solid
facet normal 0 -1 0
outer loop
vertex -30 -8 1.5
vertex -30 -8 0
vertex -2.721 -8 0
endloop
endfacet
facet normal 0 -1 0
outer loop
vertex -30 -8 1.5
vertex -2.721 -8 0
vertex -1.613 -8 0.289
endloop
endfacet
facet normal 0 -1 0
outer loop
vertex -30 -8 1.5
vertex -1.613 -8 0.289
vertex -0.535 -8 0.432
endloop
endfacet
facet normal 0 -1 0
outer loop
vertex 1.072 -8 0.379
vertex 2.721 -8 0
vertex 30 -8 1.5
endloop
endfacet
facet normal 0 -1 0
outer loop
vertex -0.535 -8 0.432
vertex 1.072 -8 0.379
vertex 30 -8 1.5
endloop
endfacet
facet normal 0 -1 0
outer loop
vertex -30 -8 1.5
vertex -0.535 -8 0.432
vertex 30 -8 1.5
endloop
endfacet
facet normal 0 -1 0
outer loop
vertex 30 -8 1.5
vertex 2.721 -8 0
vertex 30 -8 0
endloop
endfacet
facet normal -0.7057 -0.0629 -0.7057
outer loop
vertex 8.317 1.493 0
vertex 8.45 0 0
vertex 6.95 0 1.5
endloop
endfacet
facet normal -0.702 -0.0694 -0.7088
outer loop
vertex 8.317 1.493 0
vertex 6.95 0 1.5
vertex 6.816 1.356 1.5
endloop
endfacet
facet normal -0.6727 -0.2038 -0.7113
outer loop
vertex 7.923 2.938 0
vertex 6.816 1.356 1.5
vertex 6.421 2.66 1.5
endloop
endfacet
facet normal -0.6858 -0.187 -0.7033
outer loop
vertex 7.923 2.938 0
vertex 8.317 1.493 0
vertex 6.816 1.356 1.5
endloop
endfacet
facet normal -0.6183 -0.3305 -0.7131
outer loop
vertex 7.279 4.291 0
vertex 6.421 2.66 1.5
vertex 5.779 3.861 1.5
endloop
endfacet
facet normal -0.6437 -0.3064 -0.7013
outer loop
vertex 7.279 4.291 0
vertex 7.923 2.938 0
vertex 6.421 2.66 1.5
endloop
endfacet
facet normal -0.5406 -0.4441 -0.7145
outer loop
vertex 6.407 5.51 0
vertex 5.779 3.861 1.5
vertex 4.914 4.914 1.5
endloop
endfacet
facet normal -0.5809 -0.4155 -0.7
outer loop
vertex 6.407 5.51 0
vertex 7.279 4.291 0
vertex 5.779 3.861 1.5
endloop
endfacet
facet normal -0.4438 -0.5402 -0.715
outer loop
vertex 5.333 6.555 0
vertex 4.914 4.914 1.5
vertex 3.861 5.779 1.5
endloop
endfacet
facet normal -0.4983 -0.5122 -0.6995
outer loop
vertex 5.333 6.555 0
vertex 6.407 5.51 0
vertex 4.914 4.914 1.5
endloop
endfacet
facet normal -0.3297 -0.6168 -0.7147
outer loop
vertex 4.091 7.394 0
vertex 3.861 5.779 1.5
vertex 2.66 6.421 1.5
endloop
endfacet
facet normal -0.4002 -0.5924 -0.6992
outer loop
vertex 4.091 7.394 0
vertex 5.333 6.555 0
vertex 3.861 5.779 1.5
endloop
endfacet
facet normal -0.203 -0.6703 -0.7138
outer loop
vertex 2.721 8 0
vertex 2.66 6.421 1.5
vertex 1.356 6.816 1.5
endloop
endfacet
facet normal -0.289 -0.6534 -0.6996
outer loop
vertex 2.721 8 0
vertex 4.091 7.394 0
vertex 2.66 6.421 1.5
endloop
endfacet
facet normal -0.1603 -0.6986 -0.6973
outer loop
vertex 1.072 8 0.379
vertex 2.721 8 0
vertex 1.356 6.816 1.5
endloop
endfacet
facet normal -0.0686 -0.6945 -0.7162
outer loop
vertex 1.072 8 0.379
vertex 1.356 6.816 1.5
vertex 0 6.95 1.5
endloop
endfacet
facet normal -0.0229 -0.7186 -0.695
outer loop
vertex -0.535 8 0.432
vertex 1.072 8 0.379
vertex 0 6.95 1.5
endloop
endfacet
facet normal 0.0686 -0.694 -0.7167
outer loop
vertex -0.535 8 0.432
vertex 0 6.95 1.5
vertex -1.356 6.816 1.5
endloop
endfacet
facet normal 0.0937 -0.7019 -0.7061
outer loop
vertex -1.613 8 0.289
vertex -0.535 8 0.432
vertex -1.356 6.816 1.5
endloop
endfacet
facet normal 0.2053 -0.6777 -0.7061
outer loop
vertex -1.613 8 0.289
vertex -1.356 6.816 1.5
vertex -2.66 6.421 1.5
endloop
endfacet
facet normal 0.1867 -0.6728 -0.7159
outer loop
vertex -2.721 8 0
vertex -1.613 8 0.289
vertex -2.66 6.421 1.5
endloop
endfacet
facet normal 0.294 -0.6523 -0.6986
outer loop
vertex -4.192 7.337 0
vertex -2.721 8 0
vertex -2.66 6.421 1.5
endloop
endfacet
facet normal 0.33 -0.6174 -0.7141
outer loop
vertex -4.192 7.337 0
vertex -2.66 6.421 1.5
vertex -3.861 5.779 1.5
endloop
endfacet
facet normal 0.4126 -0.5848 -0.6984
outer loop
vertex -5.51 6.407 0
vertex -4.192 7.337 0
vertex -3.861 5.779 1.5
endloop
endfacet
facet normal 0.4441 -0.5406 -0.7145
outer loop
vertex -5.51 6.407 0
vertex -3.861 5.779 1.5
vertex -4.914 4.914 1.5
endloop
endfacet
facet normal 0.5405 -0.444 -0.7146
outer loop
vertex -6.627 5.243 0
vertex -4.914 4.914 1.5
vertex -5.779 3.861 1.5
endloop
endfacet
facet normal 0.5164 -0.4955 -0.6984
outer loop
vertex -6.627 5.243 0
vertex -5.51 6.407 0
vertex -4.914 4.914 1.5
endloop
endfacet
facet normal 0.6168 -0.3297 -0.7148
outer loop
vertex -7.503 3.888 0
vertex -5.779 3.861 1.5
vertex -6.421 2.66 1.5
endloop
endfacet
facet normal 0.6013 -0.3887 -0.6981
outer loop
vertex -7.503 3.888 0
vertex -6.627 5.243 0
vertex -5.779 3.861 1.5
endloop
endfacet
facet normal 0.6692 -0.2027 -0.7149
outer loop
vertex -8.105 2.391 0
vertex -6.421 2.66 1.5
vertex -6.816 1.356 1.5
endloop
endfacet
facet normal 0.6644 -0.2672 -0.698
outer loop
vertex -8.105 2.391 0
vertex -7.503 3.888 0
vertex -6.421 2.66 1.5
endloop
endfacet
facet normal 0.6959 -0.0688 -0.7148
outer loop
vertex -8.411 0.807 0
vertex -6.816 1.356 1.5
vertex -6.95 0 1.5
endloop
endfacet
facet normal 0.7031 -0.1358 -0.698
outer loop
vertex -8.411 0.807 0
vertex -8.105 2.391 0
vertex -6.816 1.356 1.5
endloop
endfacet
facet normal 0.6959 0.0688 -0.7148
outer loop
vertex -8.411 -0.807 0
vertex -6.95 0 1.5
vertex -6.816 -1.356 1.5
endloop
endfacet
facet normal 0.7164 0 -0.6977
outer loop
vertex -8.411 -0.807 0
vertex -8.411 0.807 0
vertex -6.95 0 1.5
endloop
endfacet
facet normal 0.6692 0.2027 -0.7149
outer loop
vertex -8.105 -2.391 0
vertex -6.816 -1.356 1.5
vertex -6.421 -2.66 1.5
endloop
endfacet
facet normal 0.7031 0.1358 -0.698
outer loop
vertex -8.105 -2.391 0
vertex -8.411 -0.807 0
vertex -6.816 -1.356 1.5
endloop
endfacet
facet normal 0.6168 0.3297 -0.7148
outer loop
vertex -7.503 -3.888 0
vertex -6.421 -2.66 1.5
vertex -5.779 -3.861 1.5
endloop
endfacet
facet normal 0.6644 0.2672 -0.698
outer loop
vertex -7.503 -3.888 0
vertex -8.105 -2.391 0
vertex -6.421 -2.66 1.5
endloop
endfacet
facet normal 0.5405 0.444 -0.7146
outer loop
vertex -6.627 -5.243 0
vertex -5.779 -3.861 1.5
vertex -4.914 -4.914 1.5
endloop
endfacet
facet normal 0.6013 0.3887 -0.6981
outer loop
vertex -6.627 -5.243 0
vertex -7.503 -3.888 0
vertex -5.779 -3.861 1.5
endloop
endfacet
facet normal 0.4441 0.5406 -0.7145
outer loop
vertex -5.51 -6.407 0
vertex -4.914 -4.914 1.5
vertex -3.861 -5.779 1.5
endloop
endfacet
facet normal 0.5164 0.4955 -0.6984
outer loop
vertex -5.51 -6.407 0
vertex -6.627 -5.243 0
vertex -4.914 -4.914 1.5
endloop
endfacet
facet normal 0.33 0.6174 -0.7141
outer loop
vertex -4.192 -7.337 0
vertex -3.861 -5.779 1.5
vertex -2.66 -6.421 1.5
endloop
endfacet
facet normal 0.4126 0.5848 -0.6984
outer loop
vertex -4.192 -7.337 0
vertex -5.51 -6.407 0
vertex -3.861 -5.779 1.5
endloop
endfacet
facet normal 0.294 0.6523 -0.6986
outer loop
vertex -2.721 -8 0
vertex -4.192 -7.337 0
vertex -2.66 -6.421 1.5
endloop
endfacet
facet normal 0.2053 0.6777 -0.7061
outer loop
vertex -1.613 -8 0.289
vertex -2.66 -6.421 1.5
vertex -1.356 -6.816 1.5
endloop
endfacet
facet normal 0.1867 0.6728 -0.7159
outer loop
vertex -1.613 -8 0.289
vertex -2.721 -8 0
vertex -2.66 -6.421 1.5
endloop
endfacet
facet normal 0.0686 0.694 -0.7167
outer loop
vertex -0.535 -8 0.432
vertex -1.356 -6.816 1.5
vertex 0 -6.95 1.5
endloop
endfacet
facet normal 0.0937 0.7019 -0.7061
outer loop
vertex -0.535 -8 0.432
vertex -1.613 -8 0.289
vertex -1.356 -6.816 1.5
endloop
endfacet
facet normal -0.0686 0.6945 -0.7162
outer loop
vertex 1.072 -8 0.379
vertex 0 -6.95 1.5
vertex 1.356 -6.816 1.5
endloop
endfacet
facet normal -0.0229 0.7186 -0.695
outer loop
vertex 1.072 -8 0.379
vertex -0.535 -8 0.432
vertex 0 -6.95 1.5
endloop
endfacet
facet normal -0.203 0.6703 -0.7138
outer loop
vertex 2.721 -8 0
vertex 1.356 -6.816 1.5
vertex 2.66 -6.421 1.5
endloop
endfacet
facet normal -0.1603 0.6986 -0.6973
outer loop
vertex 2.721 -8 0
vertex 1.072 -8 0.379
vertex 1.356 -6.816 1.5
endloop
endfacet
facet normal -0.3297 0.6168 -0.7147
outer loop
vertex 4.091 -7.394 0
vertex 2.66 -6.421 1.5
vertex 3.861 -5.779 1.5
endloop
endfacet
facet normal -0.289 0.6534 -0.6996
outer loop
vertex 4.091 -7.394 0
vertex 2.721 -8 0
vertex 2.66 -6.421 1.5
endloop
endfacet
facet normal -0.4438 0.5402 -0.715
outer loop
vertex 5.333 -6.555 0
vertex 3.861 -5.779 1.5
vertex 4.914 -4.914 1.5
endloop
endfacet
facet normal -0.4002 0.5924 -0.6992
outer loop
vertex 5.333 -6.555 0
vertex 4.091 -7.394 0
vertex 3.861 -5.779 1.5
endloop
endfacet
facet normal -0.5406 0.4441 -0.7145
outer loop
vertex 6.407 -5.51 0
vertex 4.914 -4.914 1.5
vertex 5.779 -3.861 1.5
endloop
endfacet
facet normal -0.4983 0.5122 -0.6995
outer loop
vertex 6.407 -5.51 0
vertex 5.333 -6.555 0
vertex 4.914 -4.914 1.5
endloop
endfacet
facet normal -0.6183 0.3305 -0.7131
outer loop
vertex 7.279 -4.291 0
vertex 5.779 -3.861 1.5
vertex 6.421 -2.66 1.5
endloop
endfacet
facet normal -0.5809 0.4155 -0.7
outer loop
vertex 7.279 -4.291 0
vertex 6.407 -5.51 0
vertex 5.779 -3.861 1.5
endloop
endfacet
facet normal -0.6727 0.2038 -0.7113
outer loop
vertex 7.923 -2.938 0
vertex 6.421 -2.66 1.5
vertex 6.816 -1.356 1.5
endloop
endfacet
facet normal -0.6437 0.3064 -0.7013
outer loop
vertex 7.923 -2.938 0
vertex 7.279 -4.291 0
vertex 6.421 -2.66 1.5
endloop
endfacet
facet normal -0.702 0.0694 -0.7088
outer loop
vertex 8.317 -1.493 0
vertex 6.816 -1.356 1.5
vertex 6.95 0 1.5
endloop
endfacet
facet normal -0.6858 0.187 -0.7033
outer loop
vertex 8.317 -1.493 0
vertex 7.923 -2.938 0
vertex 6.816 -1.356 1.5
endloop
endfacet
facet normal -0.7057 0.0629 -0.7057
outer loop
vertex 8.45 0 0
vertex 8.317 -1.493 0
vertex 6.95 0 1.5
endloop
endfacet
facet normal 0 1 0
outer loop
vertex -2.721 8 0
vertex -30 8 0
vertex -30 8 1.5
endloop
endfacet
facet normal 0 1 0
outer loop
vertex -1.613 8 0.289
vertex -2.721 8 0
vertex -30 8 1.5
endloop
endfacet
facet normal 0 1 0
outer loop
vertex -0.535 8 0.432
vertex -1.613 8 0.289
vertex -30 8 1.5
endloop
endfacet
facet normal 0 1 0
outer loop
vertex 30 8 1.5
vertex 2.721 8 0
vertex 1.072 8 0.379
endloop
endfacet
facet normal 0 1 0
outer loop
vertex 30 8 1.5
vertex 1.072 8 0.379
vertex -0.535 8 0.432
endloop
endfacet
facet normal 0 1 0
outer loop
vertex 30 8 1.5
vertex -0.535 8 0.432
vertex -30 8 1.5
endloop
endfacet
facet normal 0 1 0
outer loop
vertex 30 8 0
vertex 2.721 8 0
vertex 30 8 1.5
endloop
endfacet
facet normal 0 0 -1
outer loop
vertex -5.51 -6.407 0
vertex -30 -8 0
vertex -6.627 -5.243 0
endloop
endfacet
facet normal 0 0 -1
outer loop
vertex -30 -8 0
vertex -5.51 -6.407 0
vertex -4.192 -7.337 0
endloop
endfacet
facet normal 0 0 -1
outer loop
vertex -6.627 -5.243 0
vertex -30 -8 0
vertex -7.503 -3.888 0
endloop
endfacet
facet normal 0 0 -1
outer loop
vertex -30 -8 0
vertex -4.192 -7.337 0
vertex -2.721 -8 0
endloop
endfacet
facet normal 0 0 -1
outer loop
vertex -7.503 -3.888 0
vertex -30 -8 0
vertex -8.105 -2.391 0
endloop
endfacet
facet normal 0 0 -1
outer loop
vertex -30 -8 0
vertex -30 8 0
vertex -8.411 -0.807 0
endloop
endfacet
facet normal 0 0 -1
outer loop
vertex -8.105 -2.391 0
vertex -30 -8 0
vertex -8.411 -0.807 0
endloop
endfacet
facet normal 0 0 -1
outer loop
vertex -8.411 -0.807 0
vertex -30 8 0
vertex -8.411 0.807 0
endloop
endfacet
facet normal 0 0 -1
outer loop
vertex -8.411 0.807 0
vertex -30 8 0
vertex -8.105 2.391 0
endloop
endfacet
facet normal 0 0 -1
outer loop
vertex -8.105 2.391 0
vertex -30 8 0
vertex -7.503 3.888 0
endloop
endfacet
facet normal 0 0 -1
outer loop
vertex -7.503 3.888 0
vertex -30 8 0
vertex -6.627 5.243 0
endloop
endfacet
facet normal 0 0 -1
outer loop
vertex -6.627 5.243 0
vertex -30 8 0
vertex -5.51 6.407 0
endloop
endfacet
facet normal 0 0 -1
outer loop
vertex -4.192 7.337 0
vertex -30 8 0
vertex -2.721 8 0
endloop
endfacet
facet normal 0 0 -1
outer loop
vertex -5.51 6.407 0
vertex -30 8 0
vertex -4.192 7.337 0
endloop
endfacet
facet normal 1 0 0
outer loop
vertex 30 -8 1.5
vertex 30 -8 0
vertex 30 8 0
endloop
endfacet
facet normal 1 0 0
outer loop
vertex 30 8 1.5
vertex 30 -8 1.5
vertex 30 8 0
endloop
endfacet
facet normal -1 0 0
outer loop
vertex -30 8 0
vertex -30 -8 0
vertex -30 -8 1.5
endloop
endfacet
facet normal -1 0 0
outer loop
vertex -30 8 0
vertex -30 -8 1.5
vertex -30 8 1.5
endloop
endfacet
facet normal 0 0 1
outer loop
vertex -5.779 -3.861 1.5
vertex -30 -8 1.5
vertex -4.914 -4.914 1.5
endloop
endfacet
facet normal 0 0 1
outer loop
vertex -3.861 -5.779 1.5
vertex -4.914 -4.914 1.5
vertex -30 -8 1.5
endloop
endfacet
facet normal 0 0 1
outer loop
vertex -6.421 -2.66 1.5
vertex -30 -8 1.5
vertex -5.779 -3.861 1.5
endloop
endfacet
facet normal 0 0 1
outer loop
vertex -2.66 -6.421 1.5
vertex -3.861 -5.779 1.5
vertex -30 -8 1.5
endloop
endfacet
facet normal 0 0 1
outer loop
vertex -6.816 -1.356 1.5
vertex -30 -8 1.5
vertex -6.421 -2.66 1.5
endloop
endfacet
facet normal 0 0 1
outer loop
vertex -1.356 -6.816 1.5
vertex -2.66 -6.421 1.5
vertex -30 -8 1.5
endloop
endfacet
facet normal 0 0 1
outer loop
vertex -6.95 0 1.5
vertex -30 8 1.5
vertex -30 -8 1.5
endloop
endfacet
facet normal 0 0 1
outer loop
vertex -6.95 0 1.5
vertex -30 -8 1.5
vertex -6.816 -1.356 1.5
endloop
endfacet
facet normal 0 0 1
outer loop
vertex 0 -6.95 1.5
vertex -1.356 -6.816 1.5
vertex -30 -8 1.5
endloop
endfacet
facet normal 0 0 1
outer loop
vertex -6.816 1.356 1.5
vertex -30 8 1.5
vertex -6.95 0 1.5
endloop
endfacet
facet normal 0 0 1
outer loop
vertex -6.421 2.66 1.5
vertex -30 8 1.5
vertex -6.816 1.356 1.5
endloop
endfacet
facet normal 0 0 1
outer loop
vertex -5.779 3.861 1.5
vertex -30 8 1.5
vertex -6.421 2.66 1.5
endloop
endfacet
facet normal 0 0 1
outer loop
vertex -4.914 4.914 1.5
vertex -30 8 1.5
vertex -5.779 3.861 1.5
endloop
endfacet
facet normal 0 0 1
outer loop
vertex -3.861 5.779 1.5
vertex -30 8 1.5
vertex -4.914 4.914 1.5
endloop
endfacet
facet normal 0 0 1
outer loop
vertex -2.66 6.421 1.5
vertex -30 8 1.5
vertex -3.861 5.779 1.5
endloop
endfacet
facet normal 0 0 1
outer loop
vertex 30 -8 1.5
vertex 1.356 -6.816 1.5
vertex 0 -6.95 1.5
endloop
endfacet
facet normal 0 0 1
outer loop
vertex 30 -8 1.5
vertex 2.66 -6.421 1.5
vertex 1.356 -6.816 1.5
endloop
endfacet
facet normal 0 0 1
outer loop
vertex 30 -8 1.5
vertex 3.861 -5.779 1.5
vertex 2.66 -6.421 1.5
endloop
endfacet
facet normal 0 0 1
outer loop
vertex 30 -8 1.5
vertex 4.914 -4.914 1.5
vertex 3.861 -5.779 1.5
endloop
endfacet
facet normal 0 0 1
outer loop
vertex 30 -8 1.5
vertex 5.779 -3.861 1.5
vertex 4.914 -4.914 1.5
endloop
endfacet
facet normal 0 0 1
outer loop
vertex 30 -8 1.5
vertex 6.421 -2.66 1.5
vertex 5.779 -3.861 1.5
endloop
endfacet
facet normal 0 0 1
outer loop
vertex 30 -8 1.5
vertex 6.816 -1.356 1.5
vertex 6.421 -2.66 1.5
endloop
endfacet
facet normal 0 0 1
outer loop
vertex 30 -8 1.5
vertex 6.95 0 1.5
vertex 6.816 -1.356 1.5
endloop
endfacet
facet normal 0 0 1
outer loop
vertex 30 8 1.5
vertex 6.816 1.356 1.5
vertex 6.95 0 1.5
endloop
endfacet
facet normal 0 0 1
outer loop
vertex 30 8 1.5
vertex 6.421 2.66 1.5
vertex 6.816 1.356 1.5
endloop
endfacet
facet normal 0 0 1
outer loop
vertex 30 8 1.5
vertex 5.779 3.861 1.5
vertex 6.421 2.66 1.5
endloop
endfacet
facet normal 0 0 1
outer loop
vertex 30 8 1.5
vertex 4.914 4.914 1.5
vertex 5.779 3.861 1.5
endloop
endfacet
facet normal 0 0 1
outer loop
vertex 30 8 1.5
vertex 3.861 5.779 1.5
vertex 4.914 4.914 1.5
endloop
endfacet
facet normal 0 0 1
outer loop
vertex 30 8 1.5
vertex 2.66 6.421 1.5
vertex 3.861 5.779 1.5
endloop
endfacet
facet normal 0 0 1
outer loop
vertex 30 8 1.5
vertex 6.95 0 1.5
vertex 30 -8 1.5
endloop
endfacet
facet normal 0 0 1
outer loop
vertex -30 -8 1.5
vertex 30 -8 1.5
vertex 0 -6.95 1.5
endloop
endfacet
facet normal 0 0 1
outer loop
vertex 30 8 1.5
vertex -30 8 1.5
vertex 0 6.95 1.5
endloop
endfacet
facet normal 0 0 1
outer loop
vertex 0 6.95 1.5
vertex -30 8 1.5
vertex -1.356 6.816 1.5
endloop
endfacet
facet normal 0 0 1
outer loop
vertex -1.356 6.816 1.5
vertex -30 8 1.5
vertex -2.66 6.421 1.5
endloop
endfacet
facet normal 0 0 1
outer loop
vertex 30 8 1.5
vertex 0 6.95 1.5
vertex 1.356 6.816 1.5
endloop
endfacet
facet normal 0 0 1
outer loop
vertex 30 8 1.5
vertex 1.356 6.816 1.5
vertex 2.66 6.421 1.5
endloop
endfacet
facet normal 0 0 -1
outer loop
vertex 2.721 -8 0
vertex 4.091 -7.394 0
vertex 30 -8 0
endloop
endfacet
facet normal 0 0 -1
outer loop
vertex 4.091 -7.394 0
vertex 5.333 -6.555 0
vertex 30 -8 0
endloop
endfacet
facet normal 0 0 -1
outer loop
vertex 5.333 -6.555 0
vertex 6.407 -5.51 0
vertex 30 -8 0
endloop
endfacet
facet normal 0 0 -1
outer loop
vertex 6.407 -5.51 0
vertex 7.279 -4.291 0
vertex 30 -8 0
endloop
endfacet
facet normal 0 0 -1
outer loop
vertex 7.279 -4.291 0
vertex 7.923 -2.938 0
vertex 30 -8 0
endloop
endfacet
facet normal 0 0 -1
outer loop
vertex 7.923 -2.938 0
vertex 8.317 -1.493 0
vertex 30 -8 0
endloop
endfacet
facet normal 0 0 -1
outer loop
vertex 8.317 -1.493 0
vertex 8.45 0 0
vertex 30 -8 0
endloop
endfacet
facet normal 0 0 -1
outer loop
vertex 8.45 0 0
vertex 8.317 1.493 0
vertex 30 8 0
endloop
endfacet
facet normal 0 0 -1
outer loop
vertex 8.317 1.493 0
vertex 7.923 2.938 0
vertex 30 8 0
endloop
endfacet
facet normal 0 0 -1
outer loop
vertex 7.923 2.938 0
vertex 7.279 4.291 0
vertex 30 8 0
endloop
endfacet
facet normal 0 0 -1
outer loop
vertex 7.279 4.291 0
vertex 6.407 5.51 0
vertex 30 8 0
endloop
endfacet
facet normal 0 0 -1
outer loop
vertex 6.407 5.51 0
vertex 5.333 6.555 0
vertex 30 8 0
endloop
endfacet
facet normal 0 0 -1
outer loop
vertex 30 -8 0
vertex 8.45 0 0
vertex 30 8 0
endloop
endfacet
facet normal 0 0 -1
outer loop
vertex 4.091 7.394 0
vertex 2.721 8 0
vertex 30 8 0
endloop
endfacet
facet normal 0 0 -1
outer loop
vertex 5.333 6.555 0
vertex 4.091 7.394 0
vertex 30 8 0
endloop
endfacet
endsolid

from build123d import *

# Parameters (mm, degrees)
F0_W     = 60
F0_H     = 16
F0_R     = 6.95
F1_DEPTH = 1.5


# Not quite as in the source:
# - a fillet or chamfer that OpenCascade refuses, or shapes differently, is made with other operations: its cross-section is extruded or revolved along the edge and cut away or added


with BuildPart() as f1:
    # F0 (on Top) → F1 (new body)
    with BuildSketch(Plane.XY):
        Rectangle(F0_W, F0_H)
        Circle(F0_R, mode=Mode.SUBTRACT)
    extrude(amount=F1_DEPTH)

    # F2: chamfer of 1.5 on 1 edges, made by hand

    # F2_s1 → F2_t2 (revolve, cut)
    with BuildSketch(Plane.XZ):
        Polygon((6.95, 1.5), (8.45, 0), (6.95, 0), align=None)
    revolve(axis=Axis((0, 0, 0), (0, 0, 1)), mode=Mode.SUBTRACT)


solid = f1.part
